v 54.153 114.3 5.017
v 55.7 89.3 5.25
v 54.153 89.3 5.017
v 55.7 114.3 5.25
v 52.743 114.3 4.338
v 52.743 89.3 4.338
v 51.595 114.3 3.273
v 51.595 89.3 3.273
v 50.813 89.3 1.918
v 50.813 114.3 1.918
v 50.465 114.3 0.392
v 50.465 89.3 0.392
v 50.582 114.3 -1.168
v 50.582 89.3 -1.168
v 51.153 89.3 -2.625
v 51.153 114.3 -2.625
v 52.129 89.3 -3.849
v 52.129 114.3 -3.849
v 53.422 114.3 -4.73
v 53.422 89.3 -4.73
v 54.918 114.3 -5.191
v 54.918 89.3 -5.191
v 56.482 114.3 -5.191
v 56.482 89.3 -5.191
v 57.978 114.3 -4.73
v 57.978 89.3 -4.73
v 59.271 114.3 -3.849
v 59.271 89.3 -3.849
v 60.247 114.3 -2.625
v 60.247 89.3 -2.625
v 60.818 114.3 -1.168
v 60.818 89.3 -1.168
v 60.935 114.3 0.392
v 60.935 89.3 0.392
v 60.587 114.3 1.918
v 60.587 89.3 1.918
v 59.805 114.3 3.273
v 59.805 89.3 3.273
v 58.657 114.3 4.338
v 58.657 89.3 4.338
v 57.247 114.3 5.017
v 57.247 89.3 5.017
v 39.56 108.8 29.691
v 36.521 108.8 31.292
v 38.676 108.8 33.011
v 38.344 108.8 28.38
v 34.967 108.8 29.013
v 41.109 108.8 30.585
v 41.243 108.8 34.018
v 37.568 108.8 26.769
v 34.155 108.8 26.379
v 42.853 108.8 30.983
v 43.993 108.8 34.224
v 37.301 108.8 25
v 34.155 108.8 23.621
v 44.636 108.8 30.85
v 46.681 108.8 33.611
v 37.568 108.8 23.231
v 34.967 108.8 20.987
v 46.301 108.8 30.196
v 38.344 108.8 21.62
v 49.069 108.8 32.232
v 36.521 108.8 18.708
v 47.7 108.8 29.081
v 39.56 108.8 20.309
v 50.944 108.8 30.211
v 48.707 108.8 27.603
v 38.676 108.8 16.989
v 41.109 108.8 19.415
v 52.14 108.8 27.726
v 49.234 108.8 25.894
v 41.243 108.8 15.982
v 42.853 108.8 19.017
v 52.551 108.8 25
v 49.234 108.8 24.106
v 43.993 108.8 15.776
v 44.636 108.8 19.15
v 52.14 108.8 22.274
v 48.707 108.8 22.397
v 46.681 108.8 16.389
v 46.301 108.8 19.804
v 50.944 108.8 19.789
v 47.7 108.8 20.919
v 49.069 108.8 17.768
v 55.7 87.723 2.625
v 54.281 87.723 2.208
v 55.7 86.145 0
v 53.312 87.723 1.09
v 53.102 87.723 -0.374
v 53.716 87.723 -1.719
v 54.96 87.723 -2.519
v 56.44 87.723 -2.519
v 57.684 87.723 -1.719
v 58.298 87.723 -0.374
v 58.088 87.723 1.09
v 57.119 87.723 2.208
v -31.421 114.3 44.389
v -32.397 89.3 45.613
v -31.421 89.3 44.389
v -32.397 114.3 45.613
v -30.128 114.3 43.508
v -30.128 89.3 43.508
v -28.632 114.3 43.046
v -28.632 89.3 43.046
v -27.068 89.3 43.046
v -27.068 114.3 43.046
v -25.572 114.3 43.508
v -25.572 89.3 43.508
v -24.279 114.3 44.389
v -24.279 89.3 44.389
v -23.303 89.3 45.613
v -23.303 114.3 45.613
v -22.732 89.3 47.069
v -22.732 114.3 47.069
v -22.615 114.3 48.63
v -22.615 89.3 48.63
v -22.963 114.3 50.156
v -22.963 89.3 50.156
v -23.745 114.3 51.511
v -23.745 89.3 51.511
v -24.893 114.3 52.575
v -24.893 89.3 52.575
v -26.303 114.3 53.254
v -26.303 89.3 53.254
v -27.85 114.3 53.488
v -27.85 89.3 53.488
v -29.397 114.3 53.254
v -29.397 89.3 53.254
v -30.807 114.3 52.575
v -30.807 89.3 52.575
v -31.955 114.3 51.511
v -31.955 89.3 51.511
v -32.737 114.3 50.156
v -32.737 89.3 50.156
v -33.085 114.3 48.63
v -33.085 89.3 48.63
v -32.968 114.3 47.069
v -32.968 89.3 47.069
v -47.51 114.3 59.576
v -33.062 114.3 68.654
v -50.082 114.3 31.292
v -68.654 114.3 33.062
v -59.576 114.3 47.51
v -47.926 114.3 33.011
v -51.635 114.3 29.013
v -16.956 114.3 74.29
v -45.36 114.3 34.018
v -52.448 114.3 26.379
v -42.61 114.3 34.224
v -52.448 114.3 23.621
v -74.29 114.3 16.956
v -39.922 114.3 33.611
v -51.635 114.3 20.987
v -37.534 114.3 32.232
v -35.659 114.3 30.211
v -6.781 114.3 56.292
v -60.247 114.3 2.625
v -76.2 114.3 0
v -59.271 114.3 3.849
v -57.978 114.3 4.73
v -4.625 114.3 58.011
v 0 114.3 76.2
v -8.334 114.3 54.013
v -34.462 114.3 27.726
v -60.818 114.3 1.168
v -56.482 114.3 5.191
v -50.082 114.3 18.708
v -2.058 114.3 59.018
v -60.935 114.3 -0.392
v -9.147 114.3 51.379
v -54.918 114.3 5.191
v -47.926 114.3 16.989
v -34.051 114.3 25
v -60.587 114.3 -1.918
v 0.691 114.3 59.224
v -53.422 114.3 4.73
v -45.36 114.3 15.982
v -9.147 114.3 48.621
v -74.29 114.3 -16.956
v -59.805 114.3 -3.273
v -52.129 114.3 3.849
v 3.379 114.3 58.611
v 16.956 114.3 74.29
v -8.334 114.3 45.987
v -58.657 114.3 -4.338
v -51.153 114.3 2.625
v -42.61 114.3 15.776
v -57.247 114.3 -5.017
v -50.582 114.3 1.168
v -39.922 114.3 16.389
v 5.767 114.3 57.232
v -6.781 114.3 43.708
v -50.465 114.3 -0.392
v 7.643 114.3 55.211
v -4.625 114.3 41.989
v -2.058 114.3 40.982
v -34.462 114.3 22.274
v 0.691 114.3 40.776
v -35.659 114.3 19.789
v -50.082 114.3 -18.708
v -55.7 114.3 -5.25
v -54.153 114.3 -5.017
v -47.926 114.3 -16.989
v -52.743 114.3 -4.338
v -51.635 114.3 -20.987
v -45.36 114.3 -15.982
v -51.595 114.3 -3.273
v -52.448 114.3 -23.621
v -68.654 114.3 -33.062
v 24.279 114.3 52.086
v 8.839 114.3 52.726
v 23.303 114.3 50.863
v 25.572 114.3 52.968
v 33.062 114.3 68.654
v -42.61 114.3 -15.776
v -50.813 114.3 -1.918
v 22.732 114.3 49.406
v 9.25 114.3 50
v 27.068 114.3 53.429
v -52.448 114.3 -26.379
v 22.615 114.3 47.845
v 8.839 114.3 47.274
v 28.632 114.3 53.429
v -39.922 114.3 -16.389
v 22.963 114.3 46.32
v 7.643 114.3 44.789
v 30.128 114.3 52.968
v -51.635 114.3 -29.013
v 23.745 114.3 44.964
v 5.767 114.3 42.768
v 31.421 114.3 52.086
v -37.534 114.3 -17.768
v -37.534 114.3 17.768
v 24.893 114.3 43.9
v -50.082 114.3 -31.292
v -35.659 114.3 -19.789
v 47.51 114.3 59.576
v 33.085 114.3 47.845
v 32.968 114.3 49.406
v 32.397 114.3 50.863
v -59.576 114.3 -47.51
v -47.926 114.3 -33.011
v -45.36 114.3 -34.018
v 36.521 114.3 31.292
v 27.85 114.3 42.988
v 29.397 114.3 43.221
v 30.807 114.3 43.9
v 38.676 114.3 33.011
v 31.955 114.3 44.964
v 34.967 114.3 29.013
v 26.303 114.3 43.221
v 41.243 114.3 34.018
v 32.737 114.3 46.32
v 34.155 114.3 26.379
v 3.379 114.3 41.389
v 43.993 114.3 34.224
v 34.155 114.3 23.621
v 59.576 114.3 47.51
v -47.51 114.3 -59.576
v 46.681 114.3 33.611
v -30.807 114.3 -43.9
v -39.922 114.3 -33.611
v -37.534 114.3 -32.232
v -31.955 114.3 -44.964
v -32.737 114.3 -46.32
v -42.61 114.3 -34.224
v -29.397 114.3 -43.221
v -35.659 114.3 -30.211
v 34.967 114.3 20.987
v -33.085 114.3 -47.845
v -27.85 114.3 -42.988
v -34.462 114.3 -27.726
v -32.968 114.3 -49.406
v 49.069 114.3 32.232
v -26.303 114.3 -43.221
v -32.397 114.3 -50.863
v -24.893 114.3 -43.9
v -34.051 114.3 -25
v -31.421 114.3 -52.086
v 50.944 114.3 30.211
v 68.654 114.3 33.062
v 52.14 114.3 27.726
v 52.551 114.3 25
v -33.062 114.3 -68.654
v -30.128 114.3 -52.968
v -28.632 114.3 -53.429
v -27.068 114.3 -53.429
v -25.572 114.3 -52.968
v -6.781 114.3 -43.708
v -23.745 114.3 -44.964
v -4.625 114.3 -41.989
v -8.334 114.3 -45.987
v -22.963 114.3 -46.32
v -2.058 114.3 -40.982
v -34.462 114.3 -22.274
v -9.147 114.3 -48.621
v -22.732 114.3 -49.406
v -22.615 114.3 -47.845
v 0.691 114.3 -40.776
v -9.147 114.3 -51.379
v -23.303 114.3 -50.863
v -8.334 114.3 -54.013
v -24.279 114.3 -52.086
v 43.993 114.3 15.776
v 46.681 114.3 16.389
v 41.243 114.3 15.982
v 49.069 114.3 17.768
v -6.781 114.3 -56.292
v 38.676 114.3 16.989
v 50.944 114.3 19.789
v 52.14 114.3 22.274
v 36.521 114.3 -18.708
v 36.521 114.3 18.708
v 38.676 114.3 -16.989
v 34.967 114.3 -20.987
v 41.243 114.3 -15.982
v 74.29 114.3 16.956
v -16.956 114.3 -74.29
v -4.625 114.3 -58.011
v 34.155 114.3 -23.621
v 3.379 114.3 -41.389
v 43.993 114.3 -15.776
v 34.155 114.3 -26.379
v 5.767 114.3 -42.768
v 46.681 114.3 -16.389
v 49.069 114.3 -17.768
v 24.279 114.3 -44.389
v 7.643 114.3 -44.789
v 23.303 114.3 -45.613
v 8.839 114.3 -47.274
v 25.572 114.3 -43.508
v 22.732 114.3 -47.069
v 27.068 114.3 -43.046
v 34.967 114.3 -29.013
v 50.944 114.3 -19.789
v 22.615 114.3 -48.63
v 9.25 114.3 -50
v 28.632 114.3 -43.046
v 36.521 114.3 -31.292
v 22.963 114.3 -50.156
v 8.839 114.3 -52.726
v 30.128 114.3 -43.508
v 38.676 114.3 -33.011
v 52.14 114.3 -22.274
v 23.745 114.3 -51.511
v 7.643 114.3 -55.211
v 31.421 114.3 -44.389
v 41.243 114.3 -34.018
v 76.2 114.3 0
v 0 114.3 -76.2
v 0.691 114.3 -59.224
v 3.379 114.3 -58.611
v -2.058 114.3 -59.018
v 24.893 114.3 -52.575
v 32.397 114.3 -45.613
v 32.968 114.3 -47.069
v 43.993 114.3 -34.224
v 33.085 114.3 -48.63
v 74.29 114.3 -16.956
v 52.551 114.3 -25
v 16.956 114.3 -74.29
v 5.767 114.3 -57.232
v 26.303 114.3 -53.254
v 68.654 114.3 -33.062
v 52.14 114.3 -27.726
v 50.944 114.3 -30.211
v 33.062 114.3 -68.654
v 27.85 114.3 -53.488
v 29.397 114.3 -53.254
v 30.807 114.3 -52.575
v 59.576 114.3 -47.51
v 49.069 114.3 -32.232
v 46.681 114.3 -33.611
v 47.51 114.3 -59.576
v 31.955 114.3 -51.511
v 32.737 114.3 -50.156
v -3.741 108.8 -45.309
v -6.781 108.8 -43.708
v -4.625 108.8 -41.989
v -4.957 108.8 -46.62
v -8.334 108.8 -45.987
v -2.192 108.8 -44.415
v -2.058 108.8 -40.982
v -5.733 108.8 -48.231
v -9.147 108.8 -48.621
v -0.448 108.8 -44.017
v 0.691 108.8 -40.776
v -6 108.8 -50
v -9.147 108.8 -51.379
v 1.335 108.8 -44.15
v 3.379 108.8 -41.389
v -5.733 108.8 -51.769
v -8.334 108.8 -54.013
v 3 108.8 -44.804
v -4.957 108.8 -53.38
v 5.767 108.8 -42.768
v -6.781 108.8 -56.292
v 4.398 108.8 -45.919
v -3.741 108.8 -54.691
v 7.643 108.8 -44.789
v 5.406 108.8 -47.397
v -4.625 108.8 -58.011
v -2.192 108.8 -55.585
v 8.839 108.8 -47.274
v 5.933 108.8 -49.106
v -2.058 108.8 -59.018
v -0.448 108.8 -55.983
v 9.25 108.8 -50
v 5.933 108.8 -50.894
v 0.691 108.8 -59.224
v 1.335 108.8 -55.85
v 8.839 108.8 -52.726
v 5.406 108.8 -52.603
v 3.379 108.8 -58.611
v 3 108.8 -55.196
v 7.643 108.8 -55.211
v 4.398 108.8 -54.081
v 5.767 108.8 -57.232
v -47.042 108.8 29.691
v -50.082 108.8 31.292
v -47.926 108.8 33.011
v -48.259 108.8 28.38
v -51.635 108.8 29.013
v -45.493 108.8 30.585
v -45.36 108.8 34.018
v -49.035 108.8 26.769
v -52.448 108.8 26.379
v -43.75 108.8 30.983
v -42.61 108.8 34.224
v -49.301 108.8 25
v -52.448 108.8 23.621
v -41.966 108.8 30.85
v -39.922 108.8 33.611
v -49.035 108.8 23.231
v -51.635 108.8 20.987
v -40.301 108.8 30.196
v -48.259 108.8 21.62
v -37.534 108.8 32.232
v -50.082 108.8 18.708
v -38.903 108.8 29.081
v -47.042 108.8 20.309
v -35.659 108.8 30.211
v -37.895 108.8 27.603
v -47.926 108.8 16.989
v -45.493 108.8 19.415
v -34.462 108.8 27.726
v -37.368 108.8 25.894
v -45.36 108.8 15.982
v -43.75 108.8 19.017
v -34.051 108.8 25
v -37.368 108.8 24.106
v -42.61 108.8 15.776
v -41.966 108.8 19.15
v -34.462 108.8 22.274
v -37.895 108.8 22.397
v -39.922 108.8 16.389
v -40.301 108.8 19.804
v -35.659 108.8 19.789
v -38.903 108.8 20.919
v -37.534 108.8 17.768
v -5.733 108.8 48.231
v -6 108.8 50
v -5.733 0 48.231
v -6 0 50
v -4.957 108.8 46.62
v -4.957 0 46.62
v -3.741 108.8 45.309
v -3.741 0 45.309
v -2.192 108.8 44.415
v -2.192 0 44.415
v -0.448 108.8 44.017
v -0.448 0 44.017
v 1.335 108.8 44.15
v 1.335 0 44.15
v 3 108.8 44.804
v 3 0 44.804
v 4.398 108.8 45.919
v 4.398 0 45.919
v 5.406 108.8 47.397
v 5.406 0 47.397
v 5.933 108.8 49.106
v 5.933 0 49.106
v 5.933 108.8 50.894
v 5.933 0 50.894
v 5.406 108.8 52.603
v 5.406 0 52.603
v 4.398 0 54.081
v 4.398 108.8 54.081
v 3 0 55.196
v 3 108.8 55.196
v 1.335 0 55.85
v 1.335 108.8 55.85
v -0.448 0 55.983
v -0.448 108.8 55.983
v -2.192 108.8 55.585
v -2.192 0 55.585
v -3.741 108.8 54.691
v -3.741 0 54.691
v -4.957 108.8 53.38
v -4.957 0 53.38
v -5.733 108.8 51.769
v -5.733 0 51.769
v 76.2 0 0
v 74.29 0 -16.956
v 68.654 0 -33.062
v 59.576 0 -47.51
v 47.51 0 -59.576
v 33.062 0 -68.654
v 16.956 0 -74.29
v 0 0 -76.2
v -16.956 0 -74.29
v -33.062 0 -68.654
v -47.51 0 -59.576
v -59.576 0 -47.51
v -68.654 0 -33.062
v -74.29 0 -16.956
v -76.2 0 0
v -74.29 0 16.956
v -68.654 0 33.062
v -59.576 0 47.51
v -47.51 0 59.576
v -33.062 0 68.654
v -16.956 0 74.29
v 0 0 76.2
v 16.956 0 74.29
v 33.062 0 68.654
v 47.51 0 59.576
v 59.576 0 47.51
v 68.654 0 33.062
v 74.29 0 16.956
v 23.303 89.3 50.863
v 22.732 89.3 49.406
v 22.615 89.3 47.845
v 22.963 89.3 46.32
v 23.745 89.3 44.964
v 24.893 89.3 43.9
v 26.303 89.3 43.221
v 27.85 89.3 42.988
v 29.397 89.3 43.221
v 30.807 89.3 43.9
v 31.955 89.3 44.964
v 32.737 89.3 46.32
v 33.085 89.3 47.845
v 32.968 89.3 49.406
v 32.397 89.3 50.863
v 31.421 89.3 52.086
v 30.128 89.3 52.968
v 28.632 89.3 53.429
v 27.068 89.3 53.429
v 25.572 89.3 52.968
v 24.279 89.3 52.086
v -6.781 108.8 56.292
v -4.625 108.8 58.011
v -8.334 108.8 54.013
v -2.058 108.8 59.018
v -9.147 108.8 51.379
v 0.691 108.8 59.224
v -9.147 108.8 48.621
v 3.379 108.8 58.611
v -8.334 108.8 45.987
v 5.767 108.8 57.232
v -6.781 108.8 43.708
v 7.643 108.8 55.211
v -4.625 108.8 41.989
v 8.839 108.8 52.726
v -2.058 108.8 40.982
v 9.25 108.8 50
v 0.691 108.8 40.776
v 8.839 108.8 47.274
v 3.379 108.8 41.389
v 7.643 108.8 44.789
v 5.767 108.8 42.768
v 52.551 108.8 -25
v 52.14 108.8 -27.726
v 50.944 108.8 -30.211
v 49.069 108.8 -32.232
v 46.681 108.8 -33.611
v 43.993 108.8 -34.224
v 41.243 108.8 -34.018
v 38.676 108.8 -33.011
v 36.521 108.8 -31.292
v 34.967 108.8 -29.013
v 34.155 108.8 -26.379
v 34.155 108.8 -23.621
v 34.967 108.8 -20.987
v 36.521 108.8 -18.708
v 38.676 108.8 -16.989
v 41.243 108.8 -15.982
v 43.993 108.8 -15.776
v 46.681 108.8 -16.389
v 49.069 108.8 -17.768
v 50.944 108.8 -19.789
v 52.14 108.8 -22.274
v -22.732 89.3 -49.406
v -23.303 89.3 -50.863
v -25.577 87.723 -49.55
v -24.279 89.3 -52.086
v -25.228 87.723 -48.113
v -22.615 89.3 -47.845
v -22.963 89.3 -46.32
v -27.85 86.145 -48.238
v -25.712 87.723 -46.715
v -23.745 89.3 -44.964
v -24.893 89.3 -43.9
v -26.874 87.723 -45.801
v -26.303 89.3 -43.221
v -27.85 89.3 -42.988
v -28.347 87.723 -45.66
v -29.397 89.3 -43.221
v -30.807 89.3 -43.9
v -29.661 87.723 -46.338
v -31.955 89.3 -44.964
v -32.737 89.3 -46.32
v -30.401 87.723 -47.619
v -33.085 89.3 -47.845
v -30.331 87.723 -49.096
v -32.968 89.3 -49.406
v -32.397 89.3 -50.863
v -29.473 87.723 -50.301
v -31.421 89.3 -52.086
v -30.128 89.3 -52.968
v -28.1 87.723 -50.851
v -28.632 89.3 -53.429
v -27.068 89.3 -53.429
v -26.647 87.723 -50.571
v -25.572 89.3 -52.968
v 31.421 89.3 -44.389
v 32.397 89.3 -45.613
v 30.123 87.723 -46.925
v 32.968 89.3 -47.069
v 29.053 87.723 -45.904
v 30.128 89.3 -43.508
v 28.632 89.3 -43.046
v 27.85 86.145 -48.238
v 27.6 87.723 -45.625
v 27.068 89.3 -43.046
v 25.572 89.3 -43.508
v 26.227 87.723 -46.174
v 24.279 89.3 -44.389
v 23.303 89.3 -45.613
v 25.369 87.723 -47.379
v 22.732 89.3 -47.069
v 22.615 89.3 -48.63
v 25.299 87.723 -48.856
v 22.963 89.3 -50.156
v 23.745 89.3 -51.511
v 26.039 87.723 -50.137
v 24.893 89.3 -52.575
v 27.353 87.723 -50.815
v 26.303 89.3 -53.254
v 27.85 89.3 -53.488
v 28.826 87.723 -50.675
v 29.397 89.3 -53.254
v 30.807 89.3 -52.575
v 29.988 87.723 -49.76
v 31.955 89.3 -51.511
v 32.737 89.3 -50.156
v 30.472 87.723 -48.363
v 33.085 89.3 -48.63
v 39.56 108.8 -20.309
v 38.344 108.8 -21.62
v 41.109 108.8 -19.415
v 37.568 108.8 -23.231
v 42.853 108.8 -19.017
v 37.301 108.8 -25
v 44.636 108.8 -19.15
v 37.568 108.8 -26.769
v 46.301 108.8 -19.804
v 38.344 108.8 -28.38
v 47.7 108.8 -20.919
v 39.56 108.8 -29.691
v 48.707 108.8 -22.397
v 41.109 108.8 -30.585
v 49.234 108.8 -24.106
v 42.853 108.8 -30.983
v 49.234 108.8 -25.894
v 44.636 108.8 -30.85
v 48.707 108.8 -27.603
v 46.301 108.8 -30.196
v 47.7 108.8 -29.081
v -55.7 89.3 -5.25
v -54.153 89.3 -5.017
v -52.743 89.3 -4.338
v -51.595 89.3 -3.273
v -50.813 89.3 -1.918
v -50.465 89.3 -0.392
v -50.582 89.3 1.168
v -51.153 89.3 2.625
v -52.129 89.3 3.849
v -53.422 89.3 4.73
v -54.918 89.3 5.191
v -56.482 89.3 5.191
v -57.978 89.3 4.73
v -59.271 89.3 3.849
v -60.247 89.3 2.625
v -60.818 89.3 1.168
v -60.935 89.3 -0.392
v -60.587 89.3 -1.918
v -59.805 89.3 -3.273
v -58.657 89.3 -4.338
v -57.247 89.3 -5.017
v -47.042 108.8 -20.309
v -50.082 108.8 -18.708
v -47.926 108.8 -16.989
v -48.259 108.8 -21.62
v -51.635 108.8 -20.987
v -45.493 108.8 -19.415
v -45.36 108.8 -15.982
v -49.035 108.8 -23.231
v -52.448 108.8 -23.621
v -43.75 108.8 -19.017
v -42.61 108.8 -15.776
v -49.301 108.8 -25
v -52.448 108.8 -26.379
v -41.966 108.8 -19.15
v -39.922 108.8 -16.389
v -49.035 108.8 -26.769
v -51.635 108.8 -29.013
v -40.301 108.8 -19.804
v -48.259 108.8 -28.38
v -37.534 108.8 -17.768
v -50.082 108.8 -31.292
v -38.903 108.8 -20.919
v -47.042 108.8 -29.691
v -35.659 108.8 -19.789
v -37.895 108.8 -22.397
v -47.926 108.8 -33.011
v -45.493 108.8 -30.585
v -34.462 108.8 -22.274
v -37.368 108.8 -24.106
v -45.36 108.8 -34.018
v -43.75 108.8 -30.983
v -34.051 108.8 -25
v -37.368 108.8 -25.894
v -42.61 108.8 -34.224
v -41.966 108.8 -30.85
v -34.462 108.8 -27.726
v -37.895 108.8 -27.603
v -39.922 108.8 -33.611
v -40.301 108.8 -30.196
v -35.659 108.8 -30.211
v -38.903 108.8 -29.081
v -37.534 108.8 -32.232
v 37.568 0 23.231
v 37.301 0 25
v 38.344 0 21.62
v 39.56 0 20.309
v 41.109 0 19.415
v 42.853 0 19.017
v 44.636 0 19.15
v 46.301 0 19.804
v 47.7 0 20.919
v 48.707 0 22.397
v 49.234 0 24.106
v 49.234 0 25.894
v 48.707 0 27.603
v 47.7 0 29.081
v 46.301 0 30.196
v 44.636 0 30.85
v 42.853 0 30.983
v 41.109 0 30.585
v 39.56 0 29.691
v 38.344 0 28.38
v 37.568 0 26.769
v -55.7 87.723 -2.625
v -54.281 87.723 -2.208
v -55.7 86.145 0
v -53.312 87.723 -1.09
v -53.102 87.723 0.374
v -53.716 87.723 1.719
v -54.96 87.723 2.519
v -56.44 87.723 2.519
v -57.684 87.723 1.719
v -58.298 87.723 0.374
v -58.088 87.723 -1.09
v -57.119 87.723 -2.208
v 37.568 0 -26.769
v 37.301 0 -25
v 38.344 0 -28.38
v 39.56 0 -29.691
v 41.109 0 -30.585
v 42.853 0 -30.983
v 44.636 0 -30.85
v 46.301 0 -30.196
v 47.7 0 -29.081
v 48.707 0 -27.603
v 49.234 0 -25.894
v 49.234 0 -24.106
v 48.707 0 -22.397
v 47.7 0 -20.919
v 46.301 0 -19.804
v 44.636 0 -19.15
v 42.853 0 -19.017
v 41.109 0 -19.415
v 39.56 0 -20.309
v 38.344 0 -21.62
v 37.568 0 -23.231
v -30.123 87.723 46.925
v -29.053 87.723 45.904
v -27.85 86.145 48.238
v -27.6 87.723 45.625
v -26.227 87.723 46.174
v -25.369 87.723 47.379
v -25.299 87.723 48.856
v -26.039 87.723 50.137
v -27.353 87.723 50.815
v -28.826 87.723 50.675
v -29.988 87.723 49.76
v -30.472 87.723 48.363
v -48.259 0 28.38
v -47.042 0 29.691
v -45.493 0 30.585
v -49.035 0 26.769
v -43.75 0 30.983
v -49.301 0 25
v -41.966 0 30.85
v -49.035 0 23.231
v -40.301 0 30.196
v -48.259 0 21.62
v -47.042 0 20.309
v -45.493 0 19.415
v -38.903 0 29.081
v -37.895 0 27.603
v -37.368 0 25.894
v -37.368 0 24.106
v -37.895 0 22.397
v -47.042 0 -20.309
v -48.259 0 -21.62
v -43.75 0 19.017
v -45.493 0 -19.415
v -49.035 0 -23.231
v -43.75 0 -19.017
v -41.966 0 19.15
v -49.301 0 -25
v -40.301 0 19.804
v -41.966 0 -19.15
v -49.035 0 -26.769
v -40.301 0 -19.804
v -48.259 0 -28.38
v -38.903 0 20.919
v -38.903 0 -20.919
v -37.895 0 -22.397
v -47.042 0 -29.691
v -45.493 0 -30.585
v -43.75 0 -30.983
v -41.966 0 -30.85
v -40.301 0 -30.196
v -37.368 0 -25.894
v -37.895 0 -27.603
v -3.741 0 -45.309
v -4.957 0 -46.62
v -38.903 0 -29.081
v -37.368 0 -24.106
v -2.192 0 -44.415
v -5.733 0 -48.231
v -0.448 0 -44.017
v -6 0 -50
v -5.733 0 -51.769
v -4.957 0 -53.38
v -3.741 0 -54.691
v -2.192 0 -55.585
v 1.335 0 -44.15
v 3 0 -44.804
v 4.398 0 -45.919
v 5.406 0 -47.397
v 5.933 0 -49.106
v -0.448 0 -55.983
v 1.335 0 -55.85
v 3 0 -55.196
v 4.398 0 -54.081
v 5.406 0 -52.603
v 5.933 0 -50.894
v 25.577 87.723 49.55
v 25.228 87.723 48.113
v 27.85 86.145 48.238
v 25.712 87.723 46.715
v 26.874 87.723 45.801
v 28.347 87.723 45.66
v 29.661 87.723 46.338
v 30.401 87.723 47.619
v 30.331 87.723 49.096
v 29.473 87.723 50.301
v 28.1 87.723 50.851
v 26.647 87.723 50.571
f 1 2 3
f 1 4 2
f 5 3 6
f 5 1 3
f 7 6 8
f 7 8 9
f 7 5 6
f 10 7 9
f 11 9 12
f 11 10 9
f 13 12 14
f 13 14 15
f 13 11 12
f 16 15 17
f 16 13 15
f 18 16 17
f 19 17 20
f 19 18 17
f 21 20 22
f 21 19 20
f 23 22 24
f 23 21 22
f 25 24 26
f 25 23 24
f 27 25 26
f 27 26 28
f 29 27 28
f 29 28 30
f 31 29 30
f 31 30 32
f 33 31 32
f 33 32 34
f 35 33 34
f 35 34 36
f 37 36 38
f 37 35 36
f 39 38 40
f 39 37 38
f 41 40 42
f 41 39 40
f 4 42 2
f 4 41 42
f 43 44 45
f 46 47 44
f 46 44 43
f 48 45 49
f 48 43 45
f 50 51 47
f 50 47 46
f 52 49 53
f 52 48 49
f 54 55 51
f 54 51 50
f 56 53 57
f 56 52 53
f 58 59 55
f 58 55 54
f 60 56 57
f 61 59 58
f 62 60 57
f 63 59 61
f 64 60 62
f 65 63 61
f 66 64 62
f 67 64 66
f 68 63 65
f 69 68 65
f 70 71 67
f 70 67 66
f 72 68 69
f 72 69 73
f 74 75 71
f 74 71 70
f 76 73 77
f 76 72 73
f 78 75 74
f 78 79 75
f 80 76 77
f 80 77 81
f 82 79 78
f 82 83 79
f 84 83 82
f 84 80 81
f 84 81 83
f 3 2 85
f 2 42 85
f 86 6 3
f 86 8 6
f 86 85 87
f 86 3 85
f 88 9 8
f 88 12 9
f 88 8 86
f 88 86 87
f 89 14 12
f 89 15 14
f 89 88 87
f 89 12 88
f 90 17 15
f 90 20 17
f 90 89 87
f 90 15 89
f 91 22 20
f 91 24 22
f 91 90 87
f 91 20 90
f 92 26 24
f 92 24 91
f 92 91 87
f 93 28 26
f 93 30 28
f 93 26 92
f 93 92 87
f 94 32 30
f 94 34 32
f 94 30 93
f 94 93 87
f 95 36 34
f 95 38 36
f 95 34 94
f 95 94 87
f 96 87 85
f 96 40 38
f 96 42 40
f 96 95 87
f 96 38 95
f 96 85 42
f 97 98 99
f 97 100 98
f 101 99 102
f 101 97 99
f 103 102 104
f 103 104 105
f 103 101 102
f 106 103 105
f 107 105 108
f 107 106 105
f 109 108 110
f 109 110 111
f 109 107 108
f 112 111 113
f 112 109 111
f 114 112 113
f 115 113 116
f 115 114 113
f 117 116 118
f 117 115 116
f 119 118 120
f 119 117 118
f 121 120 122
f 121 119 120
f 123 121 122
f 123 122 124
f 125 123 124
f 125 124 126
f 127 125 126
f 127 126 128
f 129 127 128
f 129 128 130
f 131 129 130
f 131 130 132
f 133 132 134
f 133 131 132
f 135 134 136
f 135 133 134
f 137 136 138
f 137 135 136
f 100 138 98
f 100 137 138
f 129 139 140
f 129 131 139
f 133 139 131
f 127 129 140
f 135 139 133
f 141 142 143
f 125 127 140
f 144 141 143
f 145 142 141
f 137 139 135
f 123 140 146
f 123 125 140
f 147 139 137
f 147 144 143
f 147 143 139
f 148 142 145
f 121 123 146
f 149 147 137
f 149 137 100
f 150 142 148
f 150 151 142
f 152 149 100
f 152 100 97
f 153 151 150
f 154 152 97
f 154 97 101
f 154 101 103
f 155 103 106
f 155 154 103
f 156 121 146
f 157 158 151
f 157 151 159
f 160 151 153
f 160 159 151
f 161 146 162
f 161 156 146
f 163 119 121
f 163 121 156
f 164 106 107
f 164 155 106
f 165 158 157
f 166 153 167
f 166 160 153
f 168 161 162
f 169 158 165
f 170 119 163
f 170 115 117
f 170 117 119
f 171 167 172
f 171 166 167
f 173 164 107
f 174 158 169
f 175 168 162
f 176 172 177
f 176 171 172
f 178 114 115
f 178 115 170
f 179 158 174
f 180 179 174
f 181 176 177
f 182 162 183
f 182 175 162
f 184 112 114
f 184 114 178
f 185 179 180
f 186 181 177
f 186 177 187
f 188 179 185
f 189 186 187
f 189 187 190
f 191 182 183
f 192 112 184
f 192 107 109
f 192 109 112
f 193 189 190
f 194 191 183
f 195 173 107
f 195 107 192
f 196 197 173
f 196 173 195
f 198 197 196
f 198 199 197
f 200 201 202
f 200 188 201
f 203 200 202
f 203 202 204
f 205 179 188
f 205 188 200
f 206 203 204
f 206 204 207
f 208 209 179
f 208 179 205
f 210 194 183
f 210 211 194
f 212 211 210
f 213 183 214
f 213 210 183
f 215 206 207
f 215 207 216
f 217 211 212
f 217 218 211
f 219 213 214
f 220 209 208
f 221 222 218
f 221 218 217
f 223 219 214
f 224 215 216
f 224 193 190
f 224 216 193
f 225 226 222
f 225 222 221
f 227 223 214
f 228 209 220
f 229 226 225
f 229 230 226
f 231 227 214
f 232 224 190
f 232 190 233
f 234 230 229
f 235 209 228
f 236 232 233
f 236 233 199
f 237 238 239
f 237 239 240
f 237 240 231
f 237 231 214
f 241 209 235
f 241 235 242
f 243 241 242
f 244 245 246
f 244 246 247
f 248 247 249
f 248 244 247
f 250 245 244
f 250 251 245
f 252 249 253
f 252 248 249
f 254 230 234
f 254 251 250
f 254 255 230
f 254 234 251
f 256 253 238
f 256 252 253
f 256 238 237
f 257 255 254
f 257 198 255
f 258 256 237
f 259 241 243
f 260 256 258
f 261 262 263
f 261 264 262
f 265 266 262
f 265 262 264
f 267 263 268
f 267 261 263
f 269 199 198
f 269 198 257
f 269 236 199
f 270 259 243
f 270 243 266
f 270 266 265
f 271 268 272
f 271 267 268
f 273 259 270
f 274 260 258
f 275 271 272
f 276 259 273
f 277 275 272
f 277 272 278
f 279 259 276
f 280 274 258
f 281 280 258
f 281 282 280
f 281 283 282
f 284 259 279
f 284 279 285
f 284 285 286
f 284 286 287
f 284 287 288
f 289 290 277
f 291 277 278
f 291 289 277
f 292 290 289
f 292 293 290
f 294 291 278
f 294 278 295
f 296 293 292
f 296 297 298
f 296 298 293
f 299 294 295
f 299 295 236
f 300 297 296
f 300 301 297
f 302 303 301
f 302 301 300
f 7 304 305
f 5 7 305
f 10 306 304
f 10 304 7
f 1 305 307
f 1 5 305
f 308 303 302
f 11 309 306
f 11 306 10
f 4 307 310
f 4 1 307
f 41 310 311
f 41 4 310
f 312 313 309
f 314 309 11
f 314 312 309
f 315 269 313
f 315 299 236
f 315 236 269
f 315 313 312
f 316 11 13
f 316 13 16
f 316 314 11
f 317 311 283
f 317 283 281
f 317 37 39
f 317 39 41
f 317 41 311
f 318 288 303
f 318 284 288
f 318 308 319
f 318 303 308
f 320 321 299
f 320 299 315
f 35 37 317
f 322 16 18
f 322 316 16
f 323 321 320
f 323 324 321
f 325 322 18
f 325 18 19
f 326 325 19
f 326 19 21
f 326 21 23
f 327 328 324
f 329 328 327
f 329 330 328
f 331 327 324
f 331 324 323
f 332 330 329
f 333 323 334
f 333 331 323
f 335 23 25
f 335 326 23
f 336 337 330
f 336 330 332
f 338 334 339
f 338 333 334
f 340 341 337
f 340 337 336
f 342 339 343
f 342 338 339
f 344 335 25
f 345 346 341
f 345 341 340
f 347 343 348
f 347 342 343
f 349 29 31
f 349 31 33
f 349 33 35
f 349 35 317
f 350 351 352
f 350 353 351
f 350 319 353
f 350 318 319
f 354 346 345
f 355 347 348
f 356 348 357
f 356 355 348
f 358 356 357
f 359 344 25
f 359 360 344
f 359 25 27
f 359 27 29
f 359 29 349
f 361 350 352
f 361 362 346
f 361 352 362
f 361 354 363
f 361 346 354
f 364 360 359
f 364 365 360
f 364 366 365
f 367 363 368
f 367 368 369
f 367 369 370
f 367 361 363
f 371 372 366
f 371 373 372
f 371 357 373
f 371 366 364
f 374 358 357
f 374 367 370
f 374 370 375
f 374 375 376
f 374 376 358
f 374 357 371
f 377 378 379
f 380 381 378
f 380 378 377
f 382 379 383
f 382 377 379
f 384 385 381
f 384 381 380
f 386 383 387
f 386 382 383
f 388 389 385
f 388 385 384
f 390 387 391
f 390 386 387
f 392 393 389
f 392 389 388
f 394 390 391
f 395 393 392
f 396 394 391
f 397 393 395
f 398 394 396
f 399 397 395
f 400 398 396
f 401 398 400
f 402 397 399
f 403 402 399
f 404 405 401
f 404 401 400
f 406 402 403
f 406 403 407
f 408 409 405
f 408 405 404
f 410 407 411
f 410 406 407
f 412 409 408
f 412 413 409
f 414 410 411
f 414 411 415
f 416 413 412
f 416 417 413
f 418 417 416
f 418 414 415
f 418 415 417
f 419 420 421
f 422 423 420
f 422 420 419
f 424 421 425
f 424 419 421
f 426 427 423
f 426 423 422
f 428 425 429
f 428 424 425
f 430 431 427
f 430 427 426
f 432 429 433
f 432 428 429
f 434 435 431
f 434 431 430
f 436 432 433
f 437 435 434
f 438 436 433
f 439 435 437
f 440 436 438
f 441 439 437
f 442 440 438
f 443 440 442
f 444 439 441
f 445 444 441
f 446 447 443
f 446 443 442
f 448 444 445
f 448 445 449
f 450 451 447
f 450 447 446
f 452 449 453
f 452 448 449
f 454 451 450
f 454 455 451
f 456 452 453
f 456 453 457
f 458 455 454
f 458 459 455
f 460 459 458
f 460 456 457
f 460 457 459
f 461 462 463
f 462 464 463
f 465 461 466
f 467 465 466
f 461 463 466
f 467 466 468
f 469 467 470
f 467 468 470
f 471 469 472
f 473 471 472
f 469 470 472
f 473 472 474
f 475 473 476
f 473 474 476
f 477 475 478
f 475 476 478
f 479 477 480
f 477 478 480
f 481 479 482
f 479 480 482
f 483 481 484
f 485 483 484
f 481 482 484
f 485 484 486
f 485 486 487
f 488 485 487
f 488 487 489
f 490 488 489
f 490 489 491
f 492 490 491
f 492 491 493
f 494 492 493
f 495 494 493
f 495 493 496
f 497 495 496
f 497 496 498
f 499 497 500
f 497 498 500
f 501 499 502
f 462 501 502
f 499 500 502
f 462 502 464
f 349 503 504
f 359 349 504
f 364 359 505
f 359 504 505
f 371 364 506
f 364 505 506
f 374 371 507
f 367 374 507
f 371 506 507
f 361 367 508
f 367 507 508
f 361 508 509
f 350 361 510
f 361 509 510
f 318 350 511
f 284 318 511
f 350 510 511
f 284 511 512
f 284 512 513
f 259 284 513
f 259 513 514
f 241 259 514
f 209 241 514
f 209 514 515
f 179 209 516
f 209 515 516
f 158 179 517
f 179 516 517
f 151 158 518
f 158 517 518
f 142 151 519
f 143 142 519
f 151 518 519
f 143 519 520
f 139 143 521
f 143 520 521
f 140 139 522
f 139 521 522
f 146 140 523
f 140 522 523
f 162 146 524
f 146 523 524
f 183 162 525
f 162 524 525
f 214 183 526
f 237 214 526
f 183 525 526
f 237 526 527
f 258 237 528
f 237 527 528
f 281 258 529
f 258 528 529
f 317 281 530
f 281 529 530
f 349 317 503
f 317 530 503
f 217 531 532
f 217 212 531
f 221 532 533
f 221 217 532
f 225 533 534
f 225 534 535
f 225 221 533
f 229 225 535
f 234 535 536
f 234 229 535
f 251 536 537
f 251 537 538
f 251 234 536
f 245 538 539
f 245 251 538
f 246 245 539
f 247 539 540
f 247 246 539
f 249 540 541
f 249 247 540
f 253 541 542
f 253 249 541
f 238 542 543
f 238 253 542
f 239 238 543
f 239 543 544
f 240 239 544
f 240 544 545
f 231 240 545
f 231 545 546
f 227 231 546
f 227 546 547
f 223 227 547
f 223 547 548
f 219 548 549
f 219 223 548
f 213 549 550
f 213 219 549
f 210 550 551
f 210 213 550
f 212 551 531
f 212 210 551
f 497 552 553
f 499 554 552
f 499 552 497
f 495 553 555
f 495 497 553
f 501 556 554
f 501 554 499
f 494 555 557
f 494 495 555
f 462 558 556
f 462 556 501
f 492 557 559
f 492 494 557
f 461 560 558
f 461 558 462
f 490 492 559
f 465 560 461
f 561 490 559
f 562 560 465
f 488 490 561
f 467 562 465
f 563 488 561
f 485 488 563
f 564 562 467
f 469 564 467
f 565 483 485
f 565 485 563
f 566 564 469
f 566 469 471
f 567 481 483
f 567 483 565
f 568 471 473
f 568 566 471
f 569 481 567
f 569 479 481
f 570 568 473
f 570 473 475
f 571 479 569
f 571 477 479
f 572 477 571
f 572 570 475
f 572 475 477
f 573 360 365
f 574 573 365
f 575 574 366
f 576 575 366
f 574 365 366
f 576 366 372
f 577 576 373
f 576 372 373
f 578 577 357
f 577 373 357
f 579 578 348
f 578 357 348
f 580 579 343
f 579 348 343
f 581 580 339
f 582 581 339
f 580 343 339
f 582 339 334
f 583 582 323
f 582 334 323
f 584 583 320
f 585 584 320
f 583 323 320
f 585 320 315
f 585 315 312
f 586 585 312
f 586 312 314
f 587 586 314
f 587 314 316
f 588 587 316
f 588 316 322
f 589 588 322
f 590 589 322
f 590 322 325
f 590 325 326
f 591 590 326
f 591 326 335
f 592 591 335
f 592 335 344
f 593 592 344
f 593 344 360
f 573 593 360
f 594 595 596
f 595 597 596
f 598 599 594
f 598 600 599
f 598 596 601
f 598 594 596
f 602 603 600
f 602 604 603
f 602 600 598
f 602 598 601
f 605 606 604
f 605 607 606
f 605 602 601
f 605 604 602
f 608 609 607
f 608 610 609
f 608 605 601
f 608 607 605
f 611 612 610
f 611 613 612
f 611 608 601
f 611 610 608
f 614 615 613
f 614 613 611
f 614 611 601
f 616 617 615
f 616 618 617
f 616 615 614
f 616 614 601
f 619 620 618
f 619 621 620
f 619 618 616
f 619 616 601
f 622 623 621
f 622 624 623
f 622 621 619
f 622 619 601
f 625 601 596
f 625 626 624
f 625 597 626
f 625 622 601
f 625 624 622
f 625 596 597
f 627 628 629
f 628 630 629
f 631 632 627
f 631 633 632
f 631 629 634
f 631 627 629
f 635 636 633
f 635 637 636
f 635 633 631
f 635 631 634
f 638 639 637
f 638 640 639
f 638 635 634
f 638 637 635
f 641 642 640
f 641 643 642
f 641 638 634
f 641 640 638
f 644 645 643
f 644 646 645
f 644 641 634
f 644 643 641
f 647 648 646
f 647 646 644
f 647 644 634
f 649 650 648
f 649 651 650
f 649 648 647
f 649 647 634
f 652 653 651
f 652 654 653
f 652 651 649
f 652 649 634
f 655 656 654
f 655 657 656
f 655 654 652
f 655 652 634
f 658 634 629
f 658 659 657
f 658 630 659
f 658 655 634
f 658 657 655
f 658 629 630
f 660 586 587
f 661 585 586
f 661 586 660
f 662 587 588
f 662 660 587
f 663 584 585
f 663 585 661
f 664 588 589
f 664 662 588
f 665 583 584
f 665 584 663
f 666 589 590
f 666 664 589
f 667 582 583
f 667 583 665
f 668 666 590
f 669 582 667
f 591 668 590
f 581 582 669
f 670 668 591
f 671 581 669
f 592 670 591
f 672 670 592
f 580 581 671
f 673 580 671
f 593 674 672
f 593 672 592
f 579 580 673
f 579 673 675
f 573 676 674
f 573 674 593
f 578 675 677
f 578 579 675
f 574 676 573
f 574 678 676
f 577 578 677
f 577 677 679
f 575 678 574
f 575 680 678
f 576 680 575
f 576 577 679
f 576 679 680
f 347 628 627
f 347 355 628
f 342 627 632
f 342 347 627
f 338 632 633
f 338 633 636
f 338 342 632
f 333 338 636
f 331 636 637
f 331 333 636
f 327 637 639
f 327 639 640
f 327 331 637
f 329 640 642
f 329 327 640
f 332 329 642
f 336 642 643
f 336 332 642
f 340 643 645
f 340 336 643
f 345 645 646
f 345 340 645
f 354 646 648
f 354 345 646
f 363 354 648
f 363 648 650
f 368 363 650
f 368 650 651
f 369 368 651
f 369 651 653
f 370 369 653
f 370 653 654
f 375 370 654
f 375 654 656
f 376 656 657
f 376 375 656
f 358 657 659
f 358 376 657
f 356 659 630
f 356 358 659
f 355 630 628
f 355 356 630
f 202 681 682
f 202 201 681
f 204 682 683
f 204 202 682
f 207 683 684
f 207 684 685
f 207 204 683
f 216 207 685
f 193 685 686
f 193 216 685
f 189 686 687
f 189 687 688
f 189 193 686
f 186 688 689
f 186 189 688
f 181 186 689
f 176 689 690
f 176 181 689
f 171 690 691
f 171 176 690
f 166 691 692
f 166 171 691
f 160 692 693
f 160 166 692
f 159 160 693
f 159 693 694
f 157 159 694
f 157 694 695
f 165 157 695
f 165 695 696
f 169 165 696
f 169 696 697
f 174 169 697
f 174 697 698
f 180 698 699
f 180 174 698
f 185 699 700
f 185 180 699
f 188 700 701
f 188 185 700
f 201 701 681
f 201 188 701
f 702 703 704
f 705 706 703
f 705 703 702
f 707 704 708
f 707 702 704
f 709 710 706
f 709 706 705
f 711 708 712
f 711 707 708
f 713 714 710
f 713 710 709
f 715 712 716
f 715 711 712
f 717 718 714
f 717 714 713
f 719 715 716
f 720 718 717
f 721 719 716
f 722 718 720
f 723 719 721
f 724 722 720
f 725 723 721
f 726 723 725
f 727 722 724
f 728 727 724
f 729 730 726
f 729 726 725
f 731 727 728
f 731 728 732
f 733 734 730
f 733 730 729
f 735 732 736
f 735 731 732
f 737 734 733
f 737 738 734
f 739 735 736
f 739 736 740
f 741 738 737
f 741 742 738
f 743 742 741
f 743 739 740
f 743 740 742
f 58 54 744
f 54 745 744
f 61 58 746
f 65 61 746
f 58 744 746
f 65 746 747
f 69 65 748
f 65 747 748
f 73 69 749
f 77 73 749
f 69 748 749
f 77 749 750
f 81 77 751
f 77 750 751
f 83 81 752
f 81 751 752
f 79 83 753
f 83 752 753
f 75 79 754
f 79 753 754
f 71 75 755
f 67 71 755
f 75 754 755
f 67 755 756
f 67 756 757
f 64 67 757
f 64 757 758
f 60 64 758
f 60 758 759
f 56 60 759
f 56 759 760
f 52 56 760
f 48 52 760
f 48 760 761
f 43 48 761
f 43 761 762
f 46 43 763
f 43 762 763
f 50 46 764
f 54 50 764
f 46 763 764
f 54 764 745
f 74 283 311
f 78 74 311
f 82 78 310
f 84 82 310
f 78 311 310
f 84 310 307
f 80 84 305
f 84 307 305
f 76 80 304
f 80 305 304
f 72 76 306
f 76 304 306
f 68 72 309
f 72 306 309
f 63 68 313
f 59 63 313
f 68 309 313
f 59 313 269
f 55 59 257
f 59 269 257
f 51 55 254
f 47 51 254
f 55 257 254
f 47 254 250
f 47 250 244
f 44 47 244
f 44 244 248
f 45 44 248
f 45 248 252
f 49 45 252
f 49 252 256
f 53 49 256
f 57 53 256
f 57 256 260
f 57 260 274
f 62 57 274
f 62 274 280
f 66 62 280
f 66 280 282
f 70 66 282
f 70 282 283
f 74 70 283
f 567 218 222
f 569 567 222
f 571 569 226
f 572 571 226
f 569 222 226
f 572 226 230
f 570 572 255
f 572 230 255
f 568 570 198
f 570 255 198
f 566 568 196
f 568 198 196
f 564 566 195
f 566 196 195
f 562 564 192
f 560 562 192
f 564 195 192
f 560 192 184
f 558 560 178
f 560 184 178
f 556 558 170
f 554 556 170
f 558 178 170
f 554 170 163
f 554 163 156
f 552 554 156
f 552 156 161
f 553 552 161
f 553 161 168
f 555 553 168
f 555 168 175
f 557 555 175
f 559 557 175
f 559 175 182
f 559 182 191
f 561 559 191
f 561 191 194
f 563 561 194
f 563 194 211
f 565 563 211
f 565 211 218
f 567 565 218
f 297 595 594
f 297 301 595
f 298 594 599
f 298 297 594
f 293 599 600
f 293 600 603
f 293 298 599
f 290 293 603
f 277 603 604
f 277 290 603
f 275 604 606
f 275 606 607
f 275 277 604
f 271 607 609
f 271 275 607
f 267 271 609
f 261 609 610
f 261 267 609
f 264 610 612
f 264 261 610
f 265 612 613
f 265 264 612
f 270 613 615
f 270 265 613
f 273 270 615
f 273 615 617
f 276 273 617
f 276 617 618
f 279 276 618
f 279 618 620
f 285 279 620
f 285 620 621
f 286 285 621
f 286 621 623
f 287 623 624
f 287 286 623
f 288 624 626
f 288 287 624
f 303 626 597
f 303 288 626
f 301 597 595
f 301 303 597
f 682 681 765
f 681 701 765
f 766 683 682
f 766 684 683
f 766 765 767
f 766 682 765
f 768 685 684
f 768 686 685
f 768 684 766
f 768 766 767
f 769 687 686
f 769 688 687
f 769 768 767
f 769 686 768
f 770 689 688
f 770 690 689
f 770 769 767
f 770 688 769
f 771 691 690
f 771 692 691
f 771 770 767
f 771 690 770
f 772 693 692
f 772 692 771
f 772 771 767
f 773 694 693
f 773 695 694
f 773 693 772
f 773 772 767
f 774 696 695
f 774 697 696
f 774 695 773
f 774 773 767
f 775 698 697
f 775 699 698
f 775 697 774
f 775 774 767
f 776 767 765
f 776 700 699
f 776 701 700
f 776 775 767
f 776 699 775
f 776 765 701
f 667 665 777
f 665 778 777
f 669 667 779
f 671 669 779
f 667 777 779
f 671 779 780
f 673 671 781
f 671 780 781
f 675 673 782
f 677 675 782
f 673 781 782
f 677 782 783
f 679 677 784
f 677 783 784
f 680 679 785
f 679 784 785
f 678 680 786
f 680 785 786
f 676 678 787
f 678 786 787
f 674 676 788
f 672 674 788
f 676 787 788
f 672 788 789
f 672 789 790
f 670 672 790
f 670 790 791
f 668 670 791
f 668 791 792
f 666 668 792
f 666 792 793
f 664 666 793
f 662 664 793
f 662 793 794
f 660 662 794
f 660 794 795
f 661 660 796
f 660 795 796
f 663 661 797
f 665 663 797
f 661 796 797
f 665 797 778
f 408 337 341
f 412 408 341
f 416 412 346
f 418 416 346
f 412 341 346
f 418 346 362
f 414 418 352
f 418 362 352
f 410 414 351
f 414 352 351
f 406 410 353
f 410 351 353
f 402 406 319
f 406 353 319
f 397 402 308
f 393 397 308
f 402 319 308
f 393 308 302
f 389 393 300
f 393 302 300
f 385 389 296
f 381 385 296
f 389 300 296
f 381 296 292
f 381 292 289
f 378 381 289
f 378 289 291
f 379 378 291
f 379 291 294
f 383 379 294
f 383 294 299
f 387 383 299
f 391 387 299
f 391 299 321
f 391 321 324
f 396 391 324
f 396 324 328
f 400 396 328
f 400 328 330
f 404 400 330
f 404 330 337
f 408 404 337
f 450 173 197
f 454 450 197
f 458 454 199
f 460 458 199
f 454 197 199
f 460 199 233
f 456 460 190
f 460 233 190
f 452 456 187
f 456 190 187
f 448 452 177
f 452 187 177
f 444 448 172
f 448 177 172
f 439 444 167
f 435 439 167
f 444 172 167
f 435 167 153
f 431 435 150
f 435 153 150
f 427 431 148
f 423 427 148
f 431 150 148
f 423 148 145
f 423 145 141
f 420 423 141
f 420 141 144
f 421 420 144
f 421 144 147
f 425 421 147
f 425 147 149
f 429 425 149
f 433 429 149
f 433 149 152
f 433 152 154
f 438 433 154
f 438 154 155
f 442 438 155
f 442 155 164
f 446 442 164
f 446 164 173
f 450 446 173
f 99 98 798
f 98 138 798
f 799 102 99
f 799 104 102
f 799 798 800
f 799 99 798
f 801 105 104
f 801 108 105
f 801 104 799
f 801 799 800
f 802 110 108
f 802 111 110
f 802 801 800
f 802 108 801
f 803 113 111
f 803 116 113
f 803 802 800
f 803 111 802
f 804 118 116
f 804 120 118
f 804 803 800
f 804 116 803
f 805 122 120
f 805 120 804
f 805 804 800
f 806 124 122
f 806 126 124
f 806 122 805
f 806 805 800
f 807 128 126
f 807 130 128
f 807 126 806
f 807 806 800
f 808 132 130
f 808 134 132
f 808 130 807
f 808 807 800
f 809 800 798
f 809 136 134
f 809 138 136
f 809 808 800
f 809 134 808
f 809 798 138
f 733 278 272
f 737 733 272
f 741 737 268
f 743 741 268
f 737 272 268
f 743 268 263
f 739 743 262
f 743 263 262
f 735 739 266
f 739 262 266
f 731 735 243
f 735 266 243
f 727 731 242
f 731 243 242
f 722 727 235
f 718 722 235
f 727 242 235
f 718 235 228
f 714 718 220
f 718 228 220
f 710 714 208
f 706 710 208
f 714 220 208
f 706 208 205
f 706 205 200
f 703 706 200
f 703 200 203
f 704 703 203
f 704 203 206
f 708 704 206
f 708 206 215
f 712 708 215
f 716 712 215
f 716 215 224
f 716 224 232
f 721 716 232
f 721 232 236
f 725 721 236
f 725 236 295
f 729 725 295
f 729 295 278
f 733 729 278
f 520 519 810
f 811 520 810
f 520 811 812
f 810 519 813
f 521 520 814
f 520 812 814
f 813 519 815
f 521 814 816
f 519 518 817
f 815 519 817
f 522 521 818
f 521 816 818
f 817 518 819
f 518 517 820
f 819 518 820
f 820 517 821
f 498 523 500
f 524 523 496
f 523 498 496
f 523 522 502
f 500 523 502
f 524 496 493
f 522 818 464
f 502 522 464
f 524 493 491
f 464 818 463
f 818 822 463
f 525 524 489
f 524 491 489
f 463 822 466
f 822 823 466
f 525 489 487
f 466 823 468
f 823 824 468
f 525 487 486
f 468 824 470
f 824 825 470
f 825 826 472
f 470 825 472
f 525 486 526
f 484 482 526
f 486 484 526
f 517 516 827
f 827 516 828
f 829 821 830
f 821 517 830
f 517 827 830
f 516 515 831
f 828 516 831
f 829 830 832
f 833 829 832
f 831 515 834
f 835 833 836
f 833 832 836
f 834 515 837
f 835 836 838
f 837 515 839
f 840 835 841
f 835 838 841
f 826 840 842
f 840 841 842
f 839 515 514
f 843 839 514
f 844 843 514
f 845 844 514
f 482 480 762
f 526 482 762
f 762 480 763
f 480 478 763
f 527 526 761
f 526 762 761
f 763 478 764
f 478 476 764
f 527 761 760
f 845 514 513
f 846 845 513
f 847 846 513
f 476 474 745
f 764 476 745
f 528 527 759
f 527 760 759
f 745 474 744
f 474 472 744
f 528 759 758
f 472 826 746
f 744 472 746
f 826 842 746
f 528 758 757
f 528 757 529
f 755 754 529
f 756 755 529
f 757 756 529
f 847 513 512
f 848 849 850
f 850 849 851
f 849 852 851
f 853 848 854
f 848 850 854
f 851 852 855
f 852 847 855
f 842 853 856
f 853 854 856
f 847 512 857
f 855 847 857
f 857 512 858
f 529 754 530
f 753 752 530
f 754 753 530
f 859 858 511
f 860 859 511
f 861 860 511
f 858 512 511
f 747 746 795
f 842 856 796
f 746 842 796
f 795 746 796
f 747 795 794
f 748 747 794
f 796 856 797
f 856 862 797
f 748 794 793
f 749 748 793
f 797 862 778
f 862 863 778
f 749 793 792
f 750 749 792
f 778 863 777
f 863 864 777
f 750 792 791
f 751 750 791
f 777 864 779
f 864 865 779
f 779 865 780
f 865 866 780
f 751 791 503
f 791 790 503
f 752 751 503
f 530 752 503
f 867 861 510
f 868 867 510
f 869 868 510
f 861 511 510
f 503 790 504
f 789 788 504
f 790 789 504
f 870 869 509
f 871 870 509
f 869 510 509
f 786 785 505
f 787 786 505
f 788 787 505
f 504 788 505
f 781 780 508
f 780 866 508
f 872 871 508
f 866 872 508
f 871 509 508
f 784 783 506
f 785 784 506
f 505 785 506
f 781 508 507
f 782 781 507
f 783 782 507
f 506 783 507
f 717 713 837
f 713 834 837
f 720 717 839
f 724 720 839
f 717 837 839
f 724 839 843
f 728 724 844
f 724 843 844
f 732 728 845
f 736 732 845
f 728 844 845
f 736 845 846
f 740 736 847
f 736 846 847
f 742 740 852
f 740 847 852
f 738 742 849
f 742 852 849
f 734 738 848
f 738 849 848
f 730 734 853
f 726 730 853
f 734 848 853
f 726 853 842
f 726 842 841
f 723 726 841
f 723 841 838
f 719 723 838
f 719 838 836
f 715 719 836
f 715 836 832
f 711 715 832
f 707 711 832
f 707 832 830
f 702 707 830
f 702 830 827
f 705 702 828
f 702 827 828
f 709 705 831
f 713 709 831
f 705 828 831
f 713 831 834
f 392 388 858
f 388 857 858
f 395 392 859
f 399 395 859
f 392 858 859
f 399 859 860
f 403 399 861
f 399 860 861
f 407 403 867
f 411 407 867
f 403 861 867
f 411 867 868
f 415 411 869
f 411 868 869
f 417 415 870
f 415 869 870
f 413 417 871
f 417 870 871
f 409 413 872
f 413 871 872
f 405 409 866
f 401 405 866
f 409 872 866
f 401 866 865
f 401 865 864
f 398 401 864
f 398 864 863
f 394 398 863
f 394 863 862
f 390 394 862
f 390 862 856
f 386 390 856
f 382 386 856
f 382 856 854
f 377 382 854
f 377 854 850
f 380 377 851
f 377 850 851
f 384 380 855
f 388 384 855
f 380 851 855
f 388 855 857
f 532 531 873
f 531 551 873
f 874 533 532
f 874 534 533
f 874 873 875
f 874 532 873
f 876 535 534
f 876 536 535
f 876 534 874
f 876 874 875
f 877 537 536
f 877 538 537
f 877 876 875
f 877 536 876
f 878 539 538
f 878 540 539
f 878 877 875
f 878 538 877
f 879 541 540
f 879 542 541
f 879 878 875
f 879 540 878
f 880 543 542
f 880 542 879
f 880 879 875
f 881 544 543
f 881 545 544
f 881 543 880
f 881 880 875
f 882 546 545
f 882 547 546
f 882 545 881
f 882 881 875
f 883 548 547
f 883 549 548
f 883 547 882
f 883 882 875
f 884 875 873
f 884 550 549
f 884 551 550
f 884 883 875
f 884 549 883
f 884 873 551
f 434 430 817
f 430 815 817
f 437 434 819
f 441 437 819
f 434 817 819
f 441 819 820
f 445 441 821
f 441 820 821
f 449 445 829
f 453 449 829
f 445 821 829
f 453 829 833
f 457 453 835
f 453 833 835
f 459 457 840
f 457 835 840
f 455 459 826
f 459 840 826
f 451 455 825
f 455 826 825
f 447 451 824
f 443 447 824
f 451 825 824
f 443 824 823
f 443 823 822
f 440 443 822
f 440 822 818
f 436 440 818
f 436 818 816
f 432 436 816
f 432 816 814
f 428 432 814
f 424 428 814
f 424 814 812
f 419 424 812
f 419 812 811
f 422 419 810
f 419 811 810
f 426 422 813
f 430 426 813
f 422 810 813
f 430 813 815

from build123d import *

# Parameters (mm, degrees)
SKETCH1_R                        = 76.2
BOSS_EXTRUDE1_DEPTH              = 114.3
CBORE_FOR_M10_SBHCS1_D           = 12
CBORE_FOR_M10_SBHCS1_CBORE_D     = 18.5
CBORE_FOR_M10_SBHCS1_CBORE_DEPTH = 5.5
CIRPATTERN1_COUNT                = 6


with BuildPart() as part:
    # Sketch1 → Boss-Extrude1 (new body)
    with BuildSketch(Plane(origin=(0, 0, 0), x_dir=(1, 0, 0), z_dir=(0, 1, 0))):
        Circle(SKETCH1_R)
    extrude(amount=BOSS_EXTRUDE1_DEPTH)

    # CBORE for M10 SBHCS1 (through all)
    with Locations(Plane(origin=(0, 114.3, 0), x_dir=(1, 0, 0), z_dir=(0, 1, 0))):
        with Locations((0, 50), (43.301270189, 25), (43.301270189, -25), (0, -50), (-43.301270189, -25), (-43.301270189, 25)):
            CounterBoreHole(CBORE_FOR_M10_SBHCS1_D / 2, CBORE_FOR_M10_SBHCS1_CBORE_D / 2, CBORE_FOR_M10_SBHCS1_CBORE_DEPTH)

    # Sketch47 → Tap Drill for M10 Helicoil1 (revolve, cut)
    with BuildSketch(Plane(origin=(55.7, 114.3, 0), x_dir=(0, 0, 1), z_dir=(1, 0, 0))):
        Polygon((0, 0), (0, 28.15451825), (5.25, 25), (5.25, 0), align=None)
    tap_drill_for_m10_helicoil1 = revolve(axis=Axis((55.7, 120.65, 0), (0, -1, 0)), mode=Mode.SUBTRACT)

    # CirPattern1: Tap Drill for M10 Helicoil1 ×6 about axis
    cirpattern1_axis = Axis((0, 0, 0), (0, 1, 0))
    for i in range(1, CIRPATTERN1_COUNT):
        add(tap_drill_for_m10_helicoil1.rotate(cirpattern1_axis, i * 360 / CIRPATTERN1_COUNT), mode=Mode.SUBTRACT)


solid = part.part
